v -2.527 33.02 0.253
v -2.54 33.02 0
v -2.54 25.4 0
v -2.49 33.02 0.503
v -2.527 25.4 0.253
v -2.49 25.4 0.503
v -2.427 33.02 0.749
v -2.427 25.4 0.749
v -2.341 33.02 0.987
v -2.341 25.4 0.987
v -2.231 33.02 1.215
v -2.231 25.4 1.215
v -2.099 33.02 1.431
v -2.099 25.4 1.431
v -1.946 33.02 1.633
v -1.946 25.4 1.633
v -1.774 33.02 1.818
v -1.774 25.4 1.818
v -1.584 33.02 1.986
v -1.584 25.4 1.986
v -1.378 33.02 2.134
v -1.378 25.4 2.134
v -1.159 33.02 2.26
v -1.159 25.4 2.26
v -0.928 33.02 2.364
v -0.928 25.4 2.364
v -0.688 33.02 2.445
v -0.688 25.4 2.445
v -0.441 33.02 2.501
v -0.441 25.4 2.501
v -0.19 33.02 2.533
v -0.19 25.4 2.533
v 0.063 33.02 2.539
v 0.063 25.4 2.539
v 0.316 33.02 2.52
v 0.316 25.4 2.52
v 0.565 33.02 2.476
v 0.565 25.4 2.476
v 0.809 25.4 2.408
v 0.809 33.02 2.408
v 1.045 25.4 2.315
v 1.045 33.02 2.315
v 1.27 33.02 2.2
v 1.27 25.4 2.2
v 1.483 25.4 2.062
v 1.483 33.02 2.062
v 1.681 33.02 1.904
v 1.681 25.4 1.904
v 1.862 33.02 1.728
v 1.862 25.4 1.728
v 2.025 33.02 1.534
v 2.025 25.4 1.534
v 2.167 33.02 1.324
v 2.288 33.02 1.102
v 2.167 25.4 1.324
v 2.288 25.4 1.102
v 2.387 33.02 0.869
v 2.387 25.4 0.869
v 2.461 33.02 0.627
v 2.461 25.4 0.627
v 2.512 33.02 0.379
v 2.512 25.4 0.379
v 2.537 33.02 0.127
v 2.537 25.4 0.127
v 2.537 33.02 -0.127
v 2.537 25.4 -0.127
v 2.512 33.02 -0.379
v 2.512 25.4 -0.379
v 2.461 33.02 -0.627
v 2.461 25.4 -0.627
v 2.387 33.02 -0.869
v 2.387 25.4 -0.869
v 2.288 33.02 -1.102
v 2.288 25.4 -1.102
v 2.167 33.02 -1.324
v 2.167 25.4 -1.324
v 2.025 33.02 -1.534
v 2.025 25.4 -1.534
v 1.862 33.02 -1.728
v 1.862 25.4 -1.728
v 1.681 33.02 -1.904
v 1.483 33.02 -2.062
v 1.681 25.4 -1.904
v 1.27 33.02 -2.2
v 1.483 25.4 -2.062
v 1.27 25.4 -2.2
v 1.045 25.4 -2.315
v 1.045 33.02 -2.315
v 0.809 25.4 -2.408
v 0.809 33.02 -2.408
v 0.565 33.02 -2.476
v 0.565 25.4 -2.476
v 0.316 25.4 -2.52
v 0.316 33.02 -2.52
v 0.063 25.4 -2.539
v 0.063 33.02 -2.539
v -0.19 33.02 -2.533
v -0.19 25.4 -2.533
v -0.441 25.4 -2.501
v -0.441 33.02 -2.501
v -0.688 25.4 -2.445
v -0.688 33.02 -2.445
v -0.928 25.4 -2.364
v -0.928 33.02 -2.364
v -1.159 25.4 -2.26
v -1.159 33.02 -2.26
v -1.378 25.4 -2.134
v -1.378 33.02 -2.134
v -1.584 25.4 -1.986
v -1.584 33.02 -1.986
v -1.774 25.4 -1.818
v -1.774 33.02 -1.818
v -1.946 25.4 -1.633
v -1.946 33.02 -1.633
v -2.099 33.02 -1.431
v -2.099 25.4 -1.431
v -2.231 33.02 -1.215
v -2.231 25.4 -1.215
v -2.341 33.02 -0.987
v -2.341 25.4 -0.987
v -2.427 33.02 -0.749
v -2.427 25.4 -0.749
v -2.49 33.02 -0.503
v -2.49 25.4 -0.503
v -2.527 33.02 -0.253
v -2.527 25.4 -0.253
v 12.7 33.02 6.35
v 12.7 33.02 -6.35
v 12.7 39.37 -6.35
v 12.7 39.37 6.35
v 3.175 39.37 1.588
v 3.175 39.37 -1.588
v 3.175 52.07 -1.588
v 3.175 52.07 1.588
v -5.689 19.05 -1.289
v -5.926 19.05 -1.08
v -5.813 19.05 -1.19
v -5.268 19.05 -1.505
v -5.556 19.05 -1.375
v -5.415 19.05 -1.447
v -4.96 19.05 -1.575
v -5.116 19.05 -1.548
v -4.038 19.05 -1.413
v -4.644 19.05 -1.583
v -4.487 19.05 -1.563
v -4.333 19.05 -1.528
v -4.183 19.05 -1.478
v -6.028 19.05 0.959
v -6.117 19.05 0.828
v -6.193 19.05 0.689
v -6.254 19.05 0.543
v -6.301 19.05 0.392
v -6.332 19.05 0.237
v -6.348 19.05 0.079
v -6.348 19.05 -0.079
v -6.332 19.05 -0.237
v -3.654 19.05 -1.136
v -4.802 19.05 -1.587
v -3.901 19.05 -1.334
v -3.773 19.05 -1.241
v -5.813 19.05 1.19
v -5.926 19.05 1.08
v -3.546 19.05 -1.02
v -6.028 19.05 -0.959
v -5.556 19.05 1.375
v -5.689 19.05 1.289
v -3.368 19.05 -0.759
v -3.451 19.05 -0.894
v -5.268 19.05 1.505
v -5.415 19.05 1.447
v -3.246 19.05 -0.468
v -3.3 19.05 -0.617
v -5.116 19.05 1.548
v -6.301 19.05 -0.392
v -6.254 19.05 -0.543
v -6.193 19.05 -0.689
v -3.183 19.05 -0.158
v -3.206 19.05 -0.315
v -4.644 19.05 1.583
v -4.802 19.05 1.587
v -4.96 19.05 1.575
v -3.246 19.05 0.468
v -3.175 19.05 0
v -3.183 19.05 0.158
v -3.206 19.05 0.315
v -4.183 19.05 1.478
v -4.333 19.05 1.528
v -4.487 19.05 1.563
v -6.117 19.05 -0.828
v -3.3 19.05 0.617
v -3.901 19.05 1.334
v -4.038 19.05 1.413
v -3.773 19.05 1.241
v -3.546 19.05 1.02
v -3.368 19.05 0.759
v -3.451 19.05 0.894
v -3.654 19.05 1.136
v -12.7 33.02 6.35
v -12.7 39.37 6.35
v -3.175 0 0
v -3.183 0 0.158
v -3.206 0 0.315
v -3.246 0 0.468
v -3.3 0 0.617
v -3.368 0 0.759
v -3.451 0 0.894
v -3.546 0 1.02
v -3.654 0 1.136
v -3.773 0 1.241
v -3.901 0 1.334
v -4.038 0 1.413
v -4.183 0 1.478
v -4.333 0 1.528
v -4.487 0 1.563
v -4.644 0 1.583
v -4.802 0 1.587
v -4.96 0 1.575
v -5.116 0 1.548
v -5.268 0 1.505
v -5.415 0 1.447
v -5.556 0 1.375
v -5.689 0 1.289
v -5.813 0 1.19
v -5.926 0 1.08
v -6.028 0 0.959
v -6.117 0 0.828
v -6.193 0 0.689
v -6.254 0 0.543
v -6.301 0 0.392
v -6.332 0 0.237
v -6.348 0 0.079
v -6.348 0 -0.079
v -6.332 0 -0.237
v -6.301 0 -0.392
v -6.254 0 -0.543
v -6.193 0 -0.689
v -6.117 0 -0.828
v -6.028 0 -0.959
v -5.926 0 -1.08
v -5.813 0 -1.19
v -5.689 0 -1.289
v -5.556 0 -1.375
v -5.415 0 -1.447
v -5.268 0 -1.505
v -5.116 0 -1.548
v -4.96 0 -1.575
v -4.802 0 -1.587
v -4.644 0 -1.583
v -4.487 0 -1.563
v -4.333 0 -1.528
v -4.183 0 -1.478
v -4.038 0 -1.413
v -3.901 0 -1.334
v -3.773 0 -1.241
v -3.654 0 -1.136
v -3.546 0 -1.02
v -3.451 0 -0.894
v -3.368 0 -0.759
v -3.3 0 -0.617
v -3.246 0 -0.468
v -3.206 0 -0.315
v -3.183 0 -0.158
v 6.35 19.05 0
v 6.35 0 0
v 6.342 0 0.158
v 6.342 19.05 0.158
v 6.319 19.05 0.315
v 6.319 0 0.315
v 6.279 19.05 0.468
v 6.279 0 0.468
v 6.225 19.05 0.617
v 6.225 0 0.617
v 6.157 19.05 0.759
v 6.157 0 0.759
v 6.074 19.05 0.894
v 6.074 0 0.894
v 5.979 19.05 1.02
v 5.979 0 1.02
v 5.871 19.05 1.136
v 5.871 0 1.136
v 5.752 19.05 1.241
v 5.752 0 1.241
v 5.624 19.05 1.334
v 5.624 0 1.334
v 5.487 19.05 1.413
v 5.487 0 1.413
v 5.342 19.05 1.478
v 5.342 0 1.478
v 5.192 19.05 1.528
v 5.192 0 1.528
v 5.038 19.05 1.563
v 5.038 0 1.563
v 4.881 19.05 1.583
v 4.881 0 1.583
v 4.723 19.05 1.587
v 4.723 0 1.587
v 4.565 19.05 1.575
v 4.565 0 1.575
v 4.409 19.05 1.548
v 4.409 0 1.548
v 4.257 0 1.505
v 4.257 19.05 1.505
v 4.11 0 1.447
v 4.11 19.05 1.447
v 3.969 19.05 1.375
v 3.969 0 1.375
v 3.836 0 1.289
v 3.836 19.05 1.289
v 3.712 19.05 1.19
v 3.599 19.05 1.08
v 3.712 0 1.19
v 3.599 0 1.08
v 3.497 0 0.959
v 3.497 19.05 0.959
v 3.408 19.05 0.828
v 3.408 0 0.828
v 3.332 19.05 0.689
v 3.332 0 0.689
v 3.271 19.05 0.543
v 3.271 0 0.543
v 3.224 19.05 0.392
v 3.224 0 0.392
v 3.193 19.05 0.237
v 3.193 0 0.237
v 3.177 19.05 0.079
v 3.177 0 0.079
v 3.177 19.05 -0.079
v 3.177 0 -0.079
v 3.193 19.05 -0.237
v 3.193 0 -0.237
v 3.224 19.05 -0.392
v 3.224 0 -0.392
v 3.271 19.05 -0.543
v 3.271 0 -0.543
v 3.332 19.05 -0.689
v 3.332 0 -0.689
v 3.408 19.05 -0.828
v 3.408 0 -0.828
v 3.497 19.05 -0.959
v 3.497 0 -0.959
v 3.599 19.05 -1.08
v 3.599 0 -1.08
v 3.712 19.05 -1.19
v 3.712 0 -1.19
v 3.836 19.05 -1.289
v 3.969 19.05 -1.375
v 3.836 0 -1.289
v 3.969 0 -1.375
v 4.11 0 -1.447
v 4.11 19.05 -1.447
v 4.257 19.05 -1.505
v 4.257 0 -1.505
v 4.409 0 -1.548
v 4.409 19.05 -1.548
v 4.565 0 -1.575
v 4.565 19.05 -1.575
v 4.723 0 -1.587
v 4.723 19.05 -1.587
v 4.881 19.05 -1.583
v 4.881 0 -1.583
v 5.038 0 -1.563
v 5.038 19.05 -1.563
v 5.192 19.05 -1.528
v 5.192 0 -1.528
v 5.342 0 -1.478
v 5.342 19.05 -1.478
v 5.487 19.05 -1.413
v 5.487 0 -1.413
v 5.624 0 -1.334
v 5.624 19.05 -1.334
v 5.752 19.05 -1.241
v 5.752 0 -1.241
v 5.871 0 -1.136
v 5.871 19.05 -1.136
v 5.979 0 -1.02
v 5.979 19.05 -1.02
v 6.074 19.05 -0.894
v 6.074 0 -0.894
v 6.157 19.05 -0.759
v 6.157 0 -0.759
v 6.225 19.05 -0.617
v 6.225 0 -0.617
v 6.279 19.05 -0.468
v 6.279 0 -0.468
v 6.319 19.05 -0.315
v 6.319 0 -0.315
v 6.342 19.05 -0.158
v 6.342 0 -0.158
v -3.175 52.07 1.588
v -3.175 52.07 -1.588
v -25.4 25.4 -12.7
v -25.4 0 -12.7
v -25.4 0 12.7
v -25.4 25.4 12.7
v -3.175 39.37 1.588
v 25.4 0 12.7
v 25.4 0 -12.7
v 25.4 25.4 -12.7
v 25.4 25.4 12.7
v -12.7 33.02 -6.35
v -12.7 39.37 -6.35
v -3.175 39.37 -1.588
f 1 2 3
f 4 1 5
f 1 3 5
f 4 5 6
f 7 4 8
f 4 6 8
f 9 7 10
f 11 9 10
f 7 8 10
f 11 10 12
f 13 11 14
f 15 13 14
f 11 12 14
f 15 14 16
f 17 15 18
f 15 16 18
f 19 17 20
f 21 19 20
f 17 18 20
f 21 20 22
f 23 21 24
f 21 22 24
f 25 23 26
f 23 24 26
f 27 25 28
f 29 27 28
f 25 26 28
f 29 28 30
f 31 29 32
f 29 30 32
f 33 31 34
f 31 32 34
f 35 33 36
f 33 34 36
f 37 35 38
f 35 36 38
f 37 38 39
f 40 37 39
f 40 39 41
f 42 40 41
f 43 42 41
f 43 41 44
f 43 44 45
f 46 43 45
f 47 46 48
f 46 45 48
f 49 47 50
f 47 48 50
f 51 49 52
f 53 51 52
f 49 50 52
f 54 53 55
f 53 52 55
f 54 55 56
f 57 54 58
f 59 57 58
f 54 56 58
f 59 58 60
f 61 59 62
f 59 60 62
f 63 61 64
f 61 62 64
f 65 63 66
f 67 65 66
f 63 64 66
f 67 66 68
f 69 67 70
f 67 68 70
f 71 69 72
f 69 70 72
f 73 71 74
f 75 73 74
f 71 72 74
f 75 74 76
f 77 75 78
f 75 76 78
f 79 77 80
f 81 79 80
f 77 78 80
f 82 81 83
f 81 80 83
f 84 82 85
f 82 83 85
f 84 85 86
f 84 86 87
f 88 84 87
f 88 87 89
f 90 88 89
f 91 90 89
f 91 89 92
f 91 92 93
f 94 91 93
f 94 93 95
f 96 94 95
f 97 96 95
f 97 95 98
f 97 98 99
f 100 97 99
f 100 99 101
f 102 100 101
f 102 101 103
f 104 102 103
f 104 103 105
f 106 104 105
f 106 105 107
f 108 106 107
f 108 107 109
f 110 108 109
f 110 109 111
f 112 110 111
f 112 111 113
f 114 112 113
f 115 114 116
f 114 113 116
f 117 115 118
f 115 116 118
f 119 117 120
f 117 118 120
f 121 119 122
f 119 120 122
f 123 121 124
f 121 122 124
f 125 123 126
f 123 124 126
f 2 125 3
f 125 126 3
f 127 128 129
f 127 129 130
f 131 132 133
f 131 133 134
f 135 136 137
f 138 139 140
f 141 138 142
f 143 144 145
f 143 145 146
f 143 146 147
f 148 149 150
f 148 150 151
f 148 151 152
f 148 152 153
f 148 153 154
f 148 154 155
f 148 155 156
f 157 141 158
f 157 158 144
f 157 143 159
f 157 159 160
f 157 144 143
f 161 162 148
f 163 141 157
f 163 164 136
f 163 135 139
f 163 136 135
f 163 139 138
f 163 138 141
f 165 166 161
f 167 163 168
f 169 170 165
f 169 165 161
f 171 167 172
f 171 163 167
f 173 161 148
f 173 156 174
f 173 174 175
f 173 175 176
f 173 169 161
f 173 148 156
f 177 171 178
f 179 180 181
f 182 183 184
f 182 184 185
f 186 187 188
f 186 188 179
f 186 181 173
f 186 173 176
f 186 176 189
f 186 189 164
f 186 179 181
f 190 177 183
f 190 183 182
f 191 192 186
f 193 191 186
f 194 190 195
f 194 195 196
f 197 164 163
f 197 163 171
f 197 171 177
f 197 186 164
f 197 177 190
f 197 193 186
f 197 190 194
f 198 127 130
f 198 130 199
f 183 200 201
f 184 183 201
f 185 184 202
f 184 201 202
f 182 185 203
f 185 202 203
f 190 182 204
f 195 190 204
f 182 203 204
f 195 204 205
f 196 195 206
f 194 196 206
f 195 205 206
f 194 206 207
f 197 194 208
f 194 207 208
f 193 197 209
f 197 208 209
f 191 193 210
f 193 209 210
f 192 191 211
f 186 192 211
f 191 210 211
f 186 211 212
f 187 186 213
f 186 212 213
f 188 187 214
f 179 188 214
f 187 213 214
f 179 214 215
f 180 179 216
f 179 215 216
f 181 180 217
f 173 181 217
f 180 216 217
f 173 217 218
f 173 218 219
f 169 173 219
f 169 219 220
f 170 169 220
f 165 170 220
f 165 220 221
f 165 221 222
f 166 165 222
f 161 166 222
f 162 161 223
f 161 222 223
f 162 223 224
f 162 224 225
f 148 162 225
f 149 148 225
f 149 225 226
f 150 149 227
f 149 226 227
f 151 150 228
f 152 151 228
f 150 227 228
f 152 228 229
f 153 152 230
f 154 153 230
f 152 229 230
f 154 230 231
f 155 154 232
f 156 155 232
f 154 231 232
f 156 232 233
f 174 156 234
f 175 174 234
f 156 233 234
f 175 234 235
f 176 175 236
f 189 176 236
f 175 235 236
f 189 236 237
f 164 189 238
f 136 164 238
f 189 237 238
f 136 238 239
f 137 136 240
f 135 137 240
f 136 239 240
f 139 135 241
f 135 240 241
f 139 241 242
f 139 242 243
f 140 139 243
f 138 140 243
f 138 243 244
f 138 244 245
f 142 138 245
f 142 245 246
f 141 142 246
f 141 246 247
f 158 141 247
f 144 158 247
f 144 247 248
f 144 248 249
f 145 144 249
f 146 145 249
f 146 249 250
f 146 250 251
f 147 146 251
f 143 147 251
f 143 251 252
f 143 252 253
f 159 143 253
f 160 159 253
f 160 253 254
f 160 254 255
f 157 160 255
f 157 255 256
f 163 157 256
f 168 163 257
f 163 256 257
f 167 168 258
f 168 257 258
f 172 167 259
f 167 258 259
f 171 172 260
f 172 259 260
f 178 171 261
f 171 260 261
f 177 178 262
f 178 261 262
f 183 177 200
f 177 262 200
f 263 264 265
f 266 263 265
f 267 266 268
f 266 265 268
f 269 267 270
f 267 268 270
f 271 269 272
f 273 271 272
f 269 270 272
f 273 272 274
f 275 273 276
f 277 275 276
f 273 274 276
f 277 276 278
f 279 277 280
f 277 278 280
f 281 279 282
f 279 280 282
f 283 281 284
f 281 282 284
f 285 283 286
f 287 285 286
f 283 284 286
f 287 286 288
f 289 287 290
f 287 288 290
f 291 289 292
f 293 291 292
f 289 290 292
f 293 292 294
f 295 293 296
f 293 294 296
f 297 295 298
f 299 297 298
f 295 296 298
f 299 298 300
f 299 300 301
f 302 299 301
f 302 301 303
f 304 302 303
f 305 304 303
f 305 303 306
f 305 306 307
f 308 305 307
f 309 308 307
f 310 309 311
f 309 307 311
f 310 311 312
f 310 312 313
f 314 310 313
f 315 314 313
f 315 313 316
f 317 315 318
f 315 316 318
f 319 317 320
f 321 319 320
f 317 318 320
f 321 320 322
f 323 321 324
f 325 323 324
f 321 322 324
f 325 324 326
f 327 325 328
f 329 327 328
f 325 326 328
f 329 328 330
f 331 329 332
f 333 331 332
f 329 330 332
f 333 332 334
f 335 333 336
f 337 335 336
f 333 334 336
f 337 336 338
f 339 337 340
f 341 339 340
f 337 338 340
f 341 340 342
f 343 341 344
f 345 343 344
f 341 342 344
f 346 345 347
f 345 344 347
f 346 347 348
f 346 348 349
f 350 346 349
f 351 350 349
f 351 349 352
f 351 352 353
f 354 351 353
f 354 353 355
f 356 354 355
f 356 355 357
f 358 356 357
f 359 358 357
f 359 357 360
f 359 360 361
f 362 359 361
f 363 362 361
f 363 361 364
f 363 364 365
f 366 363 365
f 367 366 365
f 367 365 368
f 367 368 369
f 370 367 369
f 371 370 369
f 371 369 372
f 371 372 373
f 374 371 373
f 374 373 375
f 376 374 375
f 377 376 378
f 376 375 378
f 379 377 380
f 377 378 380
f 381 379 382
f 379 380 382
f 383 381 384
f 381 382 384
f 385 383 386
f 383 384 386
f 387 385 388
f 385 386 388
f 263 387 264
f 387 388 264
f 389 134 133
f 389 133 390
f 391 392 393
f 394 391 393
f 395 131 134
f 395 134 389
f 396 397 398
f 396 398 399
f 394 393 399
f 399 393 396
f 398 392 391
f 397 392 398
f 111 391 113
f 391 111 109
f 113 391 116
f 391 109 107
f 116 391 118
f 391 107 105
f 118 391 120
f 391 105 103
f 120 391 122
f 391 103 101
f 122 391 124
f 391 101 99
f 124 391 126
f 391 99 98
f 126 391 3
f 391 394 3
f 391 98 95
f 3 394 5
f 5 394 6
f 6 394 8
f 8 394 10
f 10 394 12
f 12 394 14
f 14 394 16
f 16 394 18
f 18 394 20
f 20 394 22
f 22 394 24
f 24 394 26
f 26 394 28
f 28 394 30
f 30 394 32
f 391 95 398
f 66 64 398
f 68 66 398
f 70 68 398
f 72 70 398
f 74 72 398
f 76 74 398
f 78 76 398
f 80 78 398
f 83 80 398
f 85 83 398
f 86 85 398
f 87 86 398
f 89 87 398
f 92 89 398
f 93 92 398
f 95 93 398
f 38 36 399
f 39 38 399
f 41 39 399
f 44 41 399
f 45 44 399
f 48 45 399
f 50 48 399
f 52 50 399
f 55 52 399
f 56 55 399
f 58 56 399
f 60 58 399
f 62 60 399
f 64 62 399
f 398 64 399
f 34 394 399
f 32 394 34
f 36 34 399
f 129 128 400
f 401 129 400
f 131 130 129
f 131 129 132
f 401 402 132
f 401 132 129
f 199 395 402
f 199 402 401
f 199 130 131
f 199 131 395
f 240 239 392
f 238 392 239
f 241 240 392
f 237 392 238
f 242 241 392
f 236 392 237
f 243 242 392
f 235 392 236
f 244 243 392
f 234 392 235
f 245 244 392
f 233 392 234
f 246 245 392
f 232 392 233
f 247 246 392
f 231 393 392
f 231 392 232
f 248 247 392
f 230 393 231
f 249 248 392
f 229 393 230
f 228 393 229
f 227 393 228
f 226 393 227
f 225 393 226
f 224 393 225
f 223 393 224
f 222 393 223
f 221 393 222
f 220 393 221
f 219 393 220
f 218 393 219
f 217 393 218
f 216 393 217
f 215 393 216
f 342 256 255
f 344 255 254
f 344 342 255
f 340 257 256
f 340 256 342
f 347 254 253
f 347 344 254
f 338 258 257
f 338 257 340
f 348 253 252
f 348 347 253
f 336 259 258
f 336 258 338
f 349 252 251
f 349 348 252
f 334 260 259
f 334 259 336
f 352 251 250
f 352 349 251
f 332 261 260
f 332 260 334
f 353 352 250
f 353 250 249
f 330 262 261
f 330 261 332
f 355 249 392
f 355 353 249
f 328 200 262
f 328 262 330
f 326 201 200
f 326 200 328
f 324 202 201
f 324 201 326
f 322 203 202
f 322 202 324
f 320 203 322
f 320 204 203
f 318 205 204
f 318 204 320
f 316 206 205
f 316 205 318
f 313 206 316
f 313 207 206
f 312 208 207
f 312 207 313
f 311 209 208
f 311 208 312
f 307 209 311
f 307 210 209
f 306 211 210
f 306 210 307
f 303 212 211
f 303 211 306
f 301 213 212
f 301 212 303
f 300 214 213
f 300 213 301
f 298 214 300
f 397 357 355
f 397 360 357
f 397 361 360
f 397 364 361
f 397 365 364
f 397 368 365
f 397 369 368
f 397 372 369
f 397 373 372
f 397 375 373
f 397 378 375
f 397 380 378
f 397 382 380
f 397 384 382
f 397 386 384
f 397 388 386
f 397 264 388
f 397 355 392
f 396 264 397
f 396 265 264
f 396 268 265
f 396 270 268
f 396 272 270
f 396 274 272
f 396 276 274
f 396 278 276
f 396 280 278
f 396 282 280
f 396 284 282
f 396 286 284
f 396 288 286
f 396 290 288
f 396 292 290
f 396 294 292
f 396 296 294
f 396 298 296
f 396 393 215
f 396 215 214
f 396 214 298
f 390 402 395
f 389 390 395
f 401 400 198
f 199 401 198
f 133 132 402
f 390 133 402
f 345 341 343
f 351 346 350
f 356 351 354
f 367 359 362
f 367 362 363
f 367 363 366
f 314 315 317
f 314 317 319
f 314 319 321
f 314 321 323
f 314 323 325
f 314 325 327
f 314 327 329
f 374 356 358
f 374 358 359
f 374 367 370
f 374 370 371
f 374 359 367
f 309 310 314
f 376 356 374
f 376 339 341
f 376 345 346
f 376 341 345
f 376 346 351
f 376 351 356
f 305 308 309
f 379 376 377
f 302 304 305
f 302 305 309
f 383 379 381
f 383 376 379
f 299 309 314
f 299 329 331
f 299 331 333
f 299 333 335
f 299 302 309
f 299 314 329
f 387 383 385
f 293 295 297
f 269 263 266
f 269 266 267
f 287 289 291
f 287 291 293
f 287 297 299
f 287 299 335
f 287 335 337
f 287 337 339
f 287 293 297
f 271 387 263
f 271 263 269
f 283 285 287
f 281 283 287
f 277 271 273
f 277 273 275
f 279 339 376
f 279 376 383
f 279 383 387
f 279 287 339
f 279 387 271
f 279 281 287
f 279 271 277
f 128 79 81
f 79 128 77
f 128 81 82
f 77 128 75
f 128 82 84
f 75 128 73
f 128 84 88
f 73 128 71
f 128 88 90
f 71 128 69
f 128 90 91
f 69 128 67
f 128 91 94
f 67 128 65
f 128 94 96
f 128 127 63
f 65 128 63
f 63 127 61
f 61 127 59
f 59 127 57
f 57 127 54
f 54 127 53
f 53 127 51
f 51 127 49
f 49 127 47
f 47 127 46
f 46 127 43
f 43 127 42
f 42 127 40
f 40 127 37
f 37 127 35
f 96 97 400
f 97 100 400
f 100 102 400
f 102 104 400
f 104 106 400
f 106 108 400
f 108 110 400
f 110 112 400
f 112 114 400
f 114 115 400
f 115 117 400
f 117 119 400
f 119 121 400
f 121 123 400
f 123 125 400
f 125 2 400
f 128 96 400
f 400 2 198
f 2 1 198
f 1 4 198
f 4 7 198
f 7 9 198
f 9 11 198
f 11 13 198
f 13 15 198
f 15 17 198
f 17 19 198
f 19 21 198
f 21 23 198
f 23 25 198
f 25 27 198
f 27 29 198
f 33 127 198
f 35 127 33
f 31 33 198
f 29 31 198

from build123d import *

# Parameters (mm, degrees)
F0_W     = 50.8
F0_H     = 25.4
F0_R     = 1.5875
F1_DEPTH = 25.4
F2_R     = 2.54
F3_DEPTH = 7.62
F4_W     = 25.4
F4_H     = 12.7
F5_DEPTH = 6.35
F6_W     = 6.35
F6_H     = 3.175
F7_DEPTH = 12.7
F8_DEPTH = 19.05


with BuildPart() as f1:
    # F0 (on Front) → F1 (new body)
    with BuildSketch(Plane.XZ):
        Rectangle(F0_W, F0_H)
        with Locations((-4.7625, 0)):
            Circle(F0_R, mode=Mode.SUBTRACT)
        with Locations((4.7625, 0)):
            Circle(F0_R, mode=Mode.SUBTRACT)
        with Locations((4.7625, 0)):
            Circle(F0_R)
        with Locations((-4.7625, 0)):
            Circle(F0_R)
    extrude(amount=-F1_DEPTH)

    # F2 (on face) → F3 (join)
    with BuildSketch(Plane(origin=(0, 25.4, 0), x_dir=(-1, 0, 0), z_dir=(0, 1, 0))):
        Circle(F2_R)
    extrude(amount=F3_DEPTH)

    # F4 (on face) → F5 (join)
    with BuildSketch(Plane(origin=(0, 33.02, 0), x_dir=(-1, 0, 0), z_dir=(0, 1, 0))):
        Rectangle(F4_W, F4_H)
    extrude(amount=F5_DEPTH)

    # F6 (on face) → F7 (join)
    with BuildSketch(Plane(origin=(0, 39.37, 0), x_dir=(-1, 0, 0), z_dir=(0, 1, 0))):
        Rectangle(F6_W, F6_H)
    extrude(amount=F7_DEPTH)

    # F0 (on Front) → F8 (cut)
    with BuildSketch(Plane.XZ):
        with Locations((4.7625, 0)):
            Circle(F0_R)
        with Locations((-4.7625, 0)):
            Circle(F0_R)
    extrude(amount=-F8_DEPTH, mode=Mode.SUBTRACT)


solid = f1.part
